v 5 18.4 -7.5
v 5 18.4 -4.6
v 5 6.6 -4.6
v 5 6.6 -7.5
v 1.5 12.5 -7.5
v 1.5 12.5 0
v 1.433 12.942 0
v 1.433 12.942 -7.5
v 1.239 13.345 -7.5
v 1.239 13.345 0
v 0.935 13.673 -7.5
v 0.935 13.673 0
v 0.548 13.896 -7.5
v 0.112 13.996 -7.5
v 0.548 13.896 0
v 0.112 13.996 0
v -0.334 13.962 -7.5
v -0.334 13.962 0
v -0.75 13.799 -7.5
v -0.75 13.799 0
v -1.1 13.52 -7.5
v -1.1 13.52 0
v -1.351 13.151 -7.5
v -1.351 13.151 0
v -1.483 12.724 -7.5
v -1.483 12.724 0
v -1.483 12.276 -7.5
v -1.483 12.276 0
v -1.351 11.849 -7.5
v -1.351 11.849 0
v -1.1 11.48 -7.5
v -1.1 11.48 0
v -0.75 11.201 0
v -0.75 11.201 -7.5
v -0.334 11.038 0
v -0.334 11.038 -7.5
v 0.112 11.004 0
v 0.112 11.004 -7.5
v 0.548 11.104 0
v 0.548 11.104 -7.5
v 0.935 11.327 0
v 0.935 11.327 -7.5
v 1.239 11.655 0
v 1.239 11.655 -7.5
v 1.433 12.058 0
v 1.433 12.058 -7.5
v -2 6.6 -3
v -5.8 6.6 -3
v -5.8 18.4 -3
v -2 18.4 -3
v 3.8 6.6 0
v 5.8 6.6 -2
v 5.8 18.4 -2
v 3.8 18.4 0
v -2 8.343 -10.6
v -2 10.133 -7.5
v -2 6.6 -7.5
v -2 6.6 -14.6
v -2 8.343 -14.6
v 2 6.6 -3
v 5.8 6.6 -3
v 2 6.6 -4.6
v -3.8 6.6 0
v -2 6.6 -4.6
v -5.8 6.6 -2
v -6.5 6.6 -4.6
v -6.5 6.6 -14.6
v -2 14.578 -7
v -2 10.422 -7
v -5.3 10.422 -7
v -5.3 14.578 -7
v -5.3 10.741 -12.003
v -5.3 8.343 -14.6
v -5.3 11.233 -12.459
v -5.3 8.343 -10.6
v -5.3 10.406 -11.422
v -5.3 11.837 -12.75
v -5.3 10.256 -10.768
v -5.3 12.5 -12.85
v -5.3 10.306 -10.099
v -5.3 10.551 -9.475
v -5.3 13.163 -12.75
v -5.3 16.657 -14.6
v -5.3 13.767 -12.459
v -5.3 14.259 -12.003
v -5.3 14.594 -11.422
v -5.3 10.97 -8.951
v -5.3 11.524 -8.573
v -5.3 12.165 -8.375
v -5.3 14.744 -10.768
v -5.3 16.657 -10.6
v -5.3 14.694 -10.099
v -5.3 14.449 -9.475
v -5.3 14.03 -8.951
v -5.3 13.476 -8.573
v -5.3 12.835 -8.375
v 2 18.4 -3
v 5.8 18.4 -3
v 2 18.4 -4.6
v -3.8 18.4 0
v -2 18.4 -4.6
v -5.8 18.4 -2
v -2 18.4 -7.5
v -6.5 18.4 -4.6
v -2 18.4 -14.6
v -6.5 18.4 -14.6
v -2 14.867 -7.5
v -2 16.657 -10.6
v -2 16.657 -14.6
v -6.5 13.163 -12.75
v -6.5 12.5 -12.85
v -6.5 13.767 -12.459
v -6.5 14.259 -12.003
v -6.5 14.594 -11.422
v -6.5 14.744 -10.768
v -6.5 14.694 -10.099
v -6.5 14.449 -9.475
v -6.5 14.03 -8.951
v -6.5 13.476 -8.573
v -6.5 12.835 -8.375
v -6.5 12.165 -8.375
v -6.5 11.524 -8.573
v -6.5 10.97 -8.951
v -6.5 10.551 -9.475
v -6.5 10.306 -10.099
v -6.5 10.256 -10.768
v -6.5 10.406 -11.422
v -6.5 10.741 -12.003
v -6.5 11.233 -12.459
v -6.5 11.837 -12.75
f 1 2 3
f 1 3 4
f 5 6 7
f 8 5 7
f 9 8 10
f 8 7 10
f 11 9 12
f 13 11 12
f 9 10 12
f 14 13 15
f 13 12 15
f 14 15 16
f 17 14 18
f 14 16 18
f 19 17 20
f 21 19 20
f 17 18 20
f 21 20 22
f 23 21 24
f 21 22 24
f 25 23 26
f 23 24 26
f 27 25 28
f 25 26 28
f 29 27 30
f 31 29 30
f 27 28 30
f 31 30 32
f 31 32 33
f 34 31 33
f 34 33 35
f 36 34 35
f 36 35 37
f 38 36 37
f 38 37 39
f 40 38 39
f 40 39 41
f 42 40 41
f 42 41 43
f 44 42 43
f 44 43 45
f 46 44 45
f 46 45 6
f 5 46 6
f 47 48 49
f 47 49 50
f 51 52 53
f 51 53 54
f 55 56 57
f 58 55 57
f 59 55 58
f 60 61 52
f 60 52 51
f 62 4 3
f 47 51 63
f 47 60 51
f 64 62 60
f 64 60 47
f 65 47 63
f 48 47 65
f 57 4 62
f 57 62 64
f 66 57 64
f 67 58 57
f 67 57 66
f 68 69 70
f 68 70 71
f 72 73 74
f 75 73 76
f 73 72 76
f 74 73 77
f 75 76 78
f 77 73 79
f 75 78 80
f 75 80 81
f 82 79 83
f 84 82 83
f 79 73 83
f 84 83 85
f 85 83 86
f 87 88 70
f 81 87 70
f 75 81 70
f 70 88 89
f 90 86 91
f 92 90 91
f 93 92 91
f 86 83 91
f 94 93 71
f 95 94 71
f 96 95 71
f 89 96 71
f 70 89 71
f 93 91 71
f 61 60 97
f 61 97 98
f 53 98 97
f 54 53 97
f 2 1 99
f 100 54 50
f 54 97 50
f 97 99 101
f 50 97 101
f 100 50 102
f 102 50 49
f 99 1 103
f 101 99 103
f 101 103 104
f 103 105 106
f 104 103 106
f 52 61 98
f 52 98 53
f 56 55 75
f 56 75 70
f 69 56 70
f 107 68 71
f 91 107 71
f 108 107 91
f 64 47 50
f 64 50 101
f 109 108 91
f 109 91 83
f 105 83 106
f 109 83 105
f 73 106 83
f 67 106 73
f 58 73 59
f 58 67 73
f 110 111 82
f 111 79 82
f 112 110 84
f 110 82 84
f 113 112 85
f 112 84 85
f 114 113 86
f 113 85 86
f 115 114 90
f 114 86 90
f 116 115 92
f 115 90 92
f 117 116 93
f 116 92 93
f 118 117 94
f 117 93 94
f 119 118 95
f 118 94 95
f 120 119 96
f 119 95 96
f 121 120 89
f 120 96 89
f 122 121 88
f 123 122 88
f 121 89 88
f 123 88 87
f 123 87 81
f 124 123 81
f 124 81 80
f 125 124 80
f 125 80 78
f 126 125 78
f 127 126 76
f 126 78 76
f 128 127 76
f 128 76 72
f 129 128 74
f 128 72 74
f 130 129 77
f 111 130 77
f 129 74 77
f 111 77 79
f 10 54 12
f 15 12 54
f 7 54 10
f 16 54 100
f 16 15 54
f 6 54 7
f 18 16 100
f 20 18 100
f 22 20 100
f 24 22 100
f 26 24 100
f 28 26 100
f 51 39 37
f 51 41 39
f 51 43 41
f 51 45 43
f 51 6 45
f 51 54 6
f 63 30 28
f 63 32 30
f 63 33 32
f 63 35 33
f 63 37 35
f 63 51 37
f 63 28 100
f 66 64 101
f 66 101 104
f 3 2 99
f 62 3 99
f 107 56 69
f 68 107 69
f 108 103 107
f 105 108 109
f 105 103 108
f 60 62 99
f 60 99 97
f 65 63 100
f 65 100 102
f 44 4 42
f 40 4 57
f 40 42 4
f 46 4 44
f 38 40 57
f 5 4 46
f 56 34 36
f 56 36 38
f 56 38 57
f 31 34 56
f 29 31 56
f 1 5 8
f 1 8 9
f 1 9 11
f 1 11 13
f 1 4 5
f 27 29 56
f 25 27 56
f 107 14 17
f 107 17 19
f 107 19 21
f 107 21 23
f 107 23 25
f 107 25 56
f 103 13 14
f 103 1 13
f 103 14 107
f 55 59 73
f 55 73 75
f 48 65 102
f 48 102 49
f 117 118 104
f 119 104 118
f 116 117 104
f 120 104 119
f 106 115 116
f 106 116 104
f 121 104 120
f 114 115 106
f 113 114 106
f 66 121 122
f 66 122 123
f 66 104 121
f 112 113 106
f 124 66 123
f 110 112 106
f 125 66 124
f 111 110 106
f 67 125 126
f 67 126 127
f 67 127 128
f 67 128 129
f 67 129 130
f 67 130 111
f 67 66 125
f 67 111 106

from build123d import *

# Parameters (mm, degrees)
BOSS_EXTRUDE1_DEPTH      = 25
CUT_EXTRUDE1_REACH       = 27
M3_TAPPED_HOLE1_D        = 3
M3_TAPPED_HOLE1_DEPTH    = 7.5
M4_CLEARANCE_HOLE1_D     = 4.5
M4_CLEARANCE_HOLE1_DEPTH = 4.5
CUT_EXTRUDE2_DEPTH       = 3.3
SKETCH9_W                = 12.3
SKETCH9_H                = 6.6
CUT_EXTRUDE3_DEPTH       = 15.6


with BuildPart() as part:
    # Sketch1 → Boss-Extrude1 (new body)
    with BuildSketch(Plane(origin=(0, 0, 0), x_dir=(1, 0, 0), z_dir=(0, 1, 0))):
        Polygon((-3.8, 0), (-5.8, 2), (-5.8, 3), (-2, 3), (-2, 4.6), (-6.5, 4.6), (-6.5, 14.6), (6.5, 14.6), (6.5, 4.6), (2, 4.6), (2, 3), (5.8, 3), (5.8, 2), (3.8, 0), align=None)
    extrude(amount=BOSS_EXTRUDE1_DEPTH)

    # Sketch2 → Cut-Extrude1 (cut, up to next)
    with BuildSketch(Plane(origin=(0, 25, 0), x_dir=(1, 0, 0), z_dir=(0, 1, 0)), mode=Mode.PRIVATE) as cut_extrude1_sk1:
        Polygon((6.5, 4.6), (5, 4.6), (5, 7.5), (-2, 7.5), (-2, 14.6), (6.5, 14.6), align=None)
    cut_extrude1_tool1 = extrude(cut_extrude1_sk1.sketch, amount=-CUT_EXTRUDE1_REACH, mode=Mode.PRIVATE) & part.part
    add(cut_extrude1_tool1.solids().sort_by_distance((2.485317, 25, -10.713833))[0], mode=Mode.SUBTRACT)

    # M3 Tapped Hole1
    with Locations(Plane(origin=(0, 0, -7.5), x_dir=(-1, 0, 0), z_dir=(0, 0, -1))):
        with Locations((0, 22), (0, 3), (0, 12.5)):
            Hole(M3_TAPPED_HOLE1_D / 2, depth=M3_TAPPED_HOLE1_DEPTH)

    # M4 Clearance Hole1
    with Locations(Plane.ZY.offset(6.5)):
        with Locations((-10.6, 12.5)):
            Hole(M4_CLEARANCE_HOLE1_D / 2, depth=M4_CLEARANCE_HOLE1_DEPTH)

    # Sketch8 → Cut-Extrude2 (cut)
    with BuildSketch(Plane(origin=(-2, 0, 0), x_dir=(0, 0, -1), z_dir=(1, 0, 0))):
        Polygon((10.6, 16.656921938), (14.6, 16.656921938), (14.6, 8.343078062), (10.6, 8.343078062), (7, 10.421539031), (7, 14.578460969), align=None)
    extrude(amount=-CUT_EXTRUDE2_DEPTH, mode=Mode.SUBTRACT)

    # Sketch9 → Cut-Extrude3 (cut, through all)
    with BuildSketch(Plane(origin=(0, 0, -14.6), x_dir=(-1, 0, 0), z_dir=(0, 0, -1))):
        with Locations((0.35, 21.7)):
            Rectangle(SKETCH9_W, SKETCH9_H)
        with Locations((0.35, 3.3)):
            Rectangle(SKETCH9_W, SKETCH9_H)
    extrude(amount=-CUT_EXTRUDE3_DEPTH, mode=Mode.SUBTRACT)


solid = part.part
